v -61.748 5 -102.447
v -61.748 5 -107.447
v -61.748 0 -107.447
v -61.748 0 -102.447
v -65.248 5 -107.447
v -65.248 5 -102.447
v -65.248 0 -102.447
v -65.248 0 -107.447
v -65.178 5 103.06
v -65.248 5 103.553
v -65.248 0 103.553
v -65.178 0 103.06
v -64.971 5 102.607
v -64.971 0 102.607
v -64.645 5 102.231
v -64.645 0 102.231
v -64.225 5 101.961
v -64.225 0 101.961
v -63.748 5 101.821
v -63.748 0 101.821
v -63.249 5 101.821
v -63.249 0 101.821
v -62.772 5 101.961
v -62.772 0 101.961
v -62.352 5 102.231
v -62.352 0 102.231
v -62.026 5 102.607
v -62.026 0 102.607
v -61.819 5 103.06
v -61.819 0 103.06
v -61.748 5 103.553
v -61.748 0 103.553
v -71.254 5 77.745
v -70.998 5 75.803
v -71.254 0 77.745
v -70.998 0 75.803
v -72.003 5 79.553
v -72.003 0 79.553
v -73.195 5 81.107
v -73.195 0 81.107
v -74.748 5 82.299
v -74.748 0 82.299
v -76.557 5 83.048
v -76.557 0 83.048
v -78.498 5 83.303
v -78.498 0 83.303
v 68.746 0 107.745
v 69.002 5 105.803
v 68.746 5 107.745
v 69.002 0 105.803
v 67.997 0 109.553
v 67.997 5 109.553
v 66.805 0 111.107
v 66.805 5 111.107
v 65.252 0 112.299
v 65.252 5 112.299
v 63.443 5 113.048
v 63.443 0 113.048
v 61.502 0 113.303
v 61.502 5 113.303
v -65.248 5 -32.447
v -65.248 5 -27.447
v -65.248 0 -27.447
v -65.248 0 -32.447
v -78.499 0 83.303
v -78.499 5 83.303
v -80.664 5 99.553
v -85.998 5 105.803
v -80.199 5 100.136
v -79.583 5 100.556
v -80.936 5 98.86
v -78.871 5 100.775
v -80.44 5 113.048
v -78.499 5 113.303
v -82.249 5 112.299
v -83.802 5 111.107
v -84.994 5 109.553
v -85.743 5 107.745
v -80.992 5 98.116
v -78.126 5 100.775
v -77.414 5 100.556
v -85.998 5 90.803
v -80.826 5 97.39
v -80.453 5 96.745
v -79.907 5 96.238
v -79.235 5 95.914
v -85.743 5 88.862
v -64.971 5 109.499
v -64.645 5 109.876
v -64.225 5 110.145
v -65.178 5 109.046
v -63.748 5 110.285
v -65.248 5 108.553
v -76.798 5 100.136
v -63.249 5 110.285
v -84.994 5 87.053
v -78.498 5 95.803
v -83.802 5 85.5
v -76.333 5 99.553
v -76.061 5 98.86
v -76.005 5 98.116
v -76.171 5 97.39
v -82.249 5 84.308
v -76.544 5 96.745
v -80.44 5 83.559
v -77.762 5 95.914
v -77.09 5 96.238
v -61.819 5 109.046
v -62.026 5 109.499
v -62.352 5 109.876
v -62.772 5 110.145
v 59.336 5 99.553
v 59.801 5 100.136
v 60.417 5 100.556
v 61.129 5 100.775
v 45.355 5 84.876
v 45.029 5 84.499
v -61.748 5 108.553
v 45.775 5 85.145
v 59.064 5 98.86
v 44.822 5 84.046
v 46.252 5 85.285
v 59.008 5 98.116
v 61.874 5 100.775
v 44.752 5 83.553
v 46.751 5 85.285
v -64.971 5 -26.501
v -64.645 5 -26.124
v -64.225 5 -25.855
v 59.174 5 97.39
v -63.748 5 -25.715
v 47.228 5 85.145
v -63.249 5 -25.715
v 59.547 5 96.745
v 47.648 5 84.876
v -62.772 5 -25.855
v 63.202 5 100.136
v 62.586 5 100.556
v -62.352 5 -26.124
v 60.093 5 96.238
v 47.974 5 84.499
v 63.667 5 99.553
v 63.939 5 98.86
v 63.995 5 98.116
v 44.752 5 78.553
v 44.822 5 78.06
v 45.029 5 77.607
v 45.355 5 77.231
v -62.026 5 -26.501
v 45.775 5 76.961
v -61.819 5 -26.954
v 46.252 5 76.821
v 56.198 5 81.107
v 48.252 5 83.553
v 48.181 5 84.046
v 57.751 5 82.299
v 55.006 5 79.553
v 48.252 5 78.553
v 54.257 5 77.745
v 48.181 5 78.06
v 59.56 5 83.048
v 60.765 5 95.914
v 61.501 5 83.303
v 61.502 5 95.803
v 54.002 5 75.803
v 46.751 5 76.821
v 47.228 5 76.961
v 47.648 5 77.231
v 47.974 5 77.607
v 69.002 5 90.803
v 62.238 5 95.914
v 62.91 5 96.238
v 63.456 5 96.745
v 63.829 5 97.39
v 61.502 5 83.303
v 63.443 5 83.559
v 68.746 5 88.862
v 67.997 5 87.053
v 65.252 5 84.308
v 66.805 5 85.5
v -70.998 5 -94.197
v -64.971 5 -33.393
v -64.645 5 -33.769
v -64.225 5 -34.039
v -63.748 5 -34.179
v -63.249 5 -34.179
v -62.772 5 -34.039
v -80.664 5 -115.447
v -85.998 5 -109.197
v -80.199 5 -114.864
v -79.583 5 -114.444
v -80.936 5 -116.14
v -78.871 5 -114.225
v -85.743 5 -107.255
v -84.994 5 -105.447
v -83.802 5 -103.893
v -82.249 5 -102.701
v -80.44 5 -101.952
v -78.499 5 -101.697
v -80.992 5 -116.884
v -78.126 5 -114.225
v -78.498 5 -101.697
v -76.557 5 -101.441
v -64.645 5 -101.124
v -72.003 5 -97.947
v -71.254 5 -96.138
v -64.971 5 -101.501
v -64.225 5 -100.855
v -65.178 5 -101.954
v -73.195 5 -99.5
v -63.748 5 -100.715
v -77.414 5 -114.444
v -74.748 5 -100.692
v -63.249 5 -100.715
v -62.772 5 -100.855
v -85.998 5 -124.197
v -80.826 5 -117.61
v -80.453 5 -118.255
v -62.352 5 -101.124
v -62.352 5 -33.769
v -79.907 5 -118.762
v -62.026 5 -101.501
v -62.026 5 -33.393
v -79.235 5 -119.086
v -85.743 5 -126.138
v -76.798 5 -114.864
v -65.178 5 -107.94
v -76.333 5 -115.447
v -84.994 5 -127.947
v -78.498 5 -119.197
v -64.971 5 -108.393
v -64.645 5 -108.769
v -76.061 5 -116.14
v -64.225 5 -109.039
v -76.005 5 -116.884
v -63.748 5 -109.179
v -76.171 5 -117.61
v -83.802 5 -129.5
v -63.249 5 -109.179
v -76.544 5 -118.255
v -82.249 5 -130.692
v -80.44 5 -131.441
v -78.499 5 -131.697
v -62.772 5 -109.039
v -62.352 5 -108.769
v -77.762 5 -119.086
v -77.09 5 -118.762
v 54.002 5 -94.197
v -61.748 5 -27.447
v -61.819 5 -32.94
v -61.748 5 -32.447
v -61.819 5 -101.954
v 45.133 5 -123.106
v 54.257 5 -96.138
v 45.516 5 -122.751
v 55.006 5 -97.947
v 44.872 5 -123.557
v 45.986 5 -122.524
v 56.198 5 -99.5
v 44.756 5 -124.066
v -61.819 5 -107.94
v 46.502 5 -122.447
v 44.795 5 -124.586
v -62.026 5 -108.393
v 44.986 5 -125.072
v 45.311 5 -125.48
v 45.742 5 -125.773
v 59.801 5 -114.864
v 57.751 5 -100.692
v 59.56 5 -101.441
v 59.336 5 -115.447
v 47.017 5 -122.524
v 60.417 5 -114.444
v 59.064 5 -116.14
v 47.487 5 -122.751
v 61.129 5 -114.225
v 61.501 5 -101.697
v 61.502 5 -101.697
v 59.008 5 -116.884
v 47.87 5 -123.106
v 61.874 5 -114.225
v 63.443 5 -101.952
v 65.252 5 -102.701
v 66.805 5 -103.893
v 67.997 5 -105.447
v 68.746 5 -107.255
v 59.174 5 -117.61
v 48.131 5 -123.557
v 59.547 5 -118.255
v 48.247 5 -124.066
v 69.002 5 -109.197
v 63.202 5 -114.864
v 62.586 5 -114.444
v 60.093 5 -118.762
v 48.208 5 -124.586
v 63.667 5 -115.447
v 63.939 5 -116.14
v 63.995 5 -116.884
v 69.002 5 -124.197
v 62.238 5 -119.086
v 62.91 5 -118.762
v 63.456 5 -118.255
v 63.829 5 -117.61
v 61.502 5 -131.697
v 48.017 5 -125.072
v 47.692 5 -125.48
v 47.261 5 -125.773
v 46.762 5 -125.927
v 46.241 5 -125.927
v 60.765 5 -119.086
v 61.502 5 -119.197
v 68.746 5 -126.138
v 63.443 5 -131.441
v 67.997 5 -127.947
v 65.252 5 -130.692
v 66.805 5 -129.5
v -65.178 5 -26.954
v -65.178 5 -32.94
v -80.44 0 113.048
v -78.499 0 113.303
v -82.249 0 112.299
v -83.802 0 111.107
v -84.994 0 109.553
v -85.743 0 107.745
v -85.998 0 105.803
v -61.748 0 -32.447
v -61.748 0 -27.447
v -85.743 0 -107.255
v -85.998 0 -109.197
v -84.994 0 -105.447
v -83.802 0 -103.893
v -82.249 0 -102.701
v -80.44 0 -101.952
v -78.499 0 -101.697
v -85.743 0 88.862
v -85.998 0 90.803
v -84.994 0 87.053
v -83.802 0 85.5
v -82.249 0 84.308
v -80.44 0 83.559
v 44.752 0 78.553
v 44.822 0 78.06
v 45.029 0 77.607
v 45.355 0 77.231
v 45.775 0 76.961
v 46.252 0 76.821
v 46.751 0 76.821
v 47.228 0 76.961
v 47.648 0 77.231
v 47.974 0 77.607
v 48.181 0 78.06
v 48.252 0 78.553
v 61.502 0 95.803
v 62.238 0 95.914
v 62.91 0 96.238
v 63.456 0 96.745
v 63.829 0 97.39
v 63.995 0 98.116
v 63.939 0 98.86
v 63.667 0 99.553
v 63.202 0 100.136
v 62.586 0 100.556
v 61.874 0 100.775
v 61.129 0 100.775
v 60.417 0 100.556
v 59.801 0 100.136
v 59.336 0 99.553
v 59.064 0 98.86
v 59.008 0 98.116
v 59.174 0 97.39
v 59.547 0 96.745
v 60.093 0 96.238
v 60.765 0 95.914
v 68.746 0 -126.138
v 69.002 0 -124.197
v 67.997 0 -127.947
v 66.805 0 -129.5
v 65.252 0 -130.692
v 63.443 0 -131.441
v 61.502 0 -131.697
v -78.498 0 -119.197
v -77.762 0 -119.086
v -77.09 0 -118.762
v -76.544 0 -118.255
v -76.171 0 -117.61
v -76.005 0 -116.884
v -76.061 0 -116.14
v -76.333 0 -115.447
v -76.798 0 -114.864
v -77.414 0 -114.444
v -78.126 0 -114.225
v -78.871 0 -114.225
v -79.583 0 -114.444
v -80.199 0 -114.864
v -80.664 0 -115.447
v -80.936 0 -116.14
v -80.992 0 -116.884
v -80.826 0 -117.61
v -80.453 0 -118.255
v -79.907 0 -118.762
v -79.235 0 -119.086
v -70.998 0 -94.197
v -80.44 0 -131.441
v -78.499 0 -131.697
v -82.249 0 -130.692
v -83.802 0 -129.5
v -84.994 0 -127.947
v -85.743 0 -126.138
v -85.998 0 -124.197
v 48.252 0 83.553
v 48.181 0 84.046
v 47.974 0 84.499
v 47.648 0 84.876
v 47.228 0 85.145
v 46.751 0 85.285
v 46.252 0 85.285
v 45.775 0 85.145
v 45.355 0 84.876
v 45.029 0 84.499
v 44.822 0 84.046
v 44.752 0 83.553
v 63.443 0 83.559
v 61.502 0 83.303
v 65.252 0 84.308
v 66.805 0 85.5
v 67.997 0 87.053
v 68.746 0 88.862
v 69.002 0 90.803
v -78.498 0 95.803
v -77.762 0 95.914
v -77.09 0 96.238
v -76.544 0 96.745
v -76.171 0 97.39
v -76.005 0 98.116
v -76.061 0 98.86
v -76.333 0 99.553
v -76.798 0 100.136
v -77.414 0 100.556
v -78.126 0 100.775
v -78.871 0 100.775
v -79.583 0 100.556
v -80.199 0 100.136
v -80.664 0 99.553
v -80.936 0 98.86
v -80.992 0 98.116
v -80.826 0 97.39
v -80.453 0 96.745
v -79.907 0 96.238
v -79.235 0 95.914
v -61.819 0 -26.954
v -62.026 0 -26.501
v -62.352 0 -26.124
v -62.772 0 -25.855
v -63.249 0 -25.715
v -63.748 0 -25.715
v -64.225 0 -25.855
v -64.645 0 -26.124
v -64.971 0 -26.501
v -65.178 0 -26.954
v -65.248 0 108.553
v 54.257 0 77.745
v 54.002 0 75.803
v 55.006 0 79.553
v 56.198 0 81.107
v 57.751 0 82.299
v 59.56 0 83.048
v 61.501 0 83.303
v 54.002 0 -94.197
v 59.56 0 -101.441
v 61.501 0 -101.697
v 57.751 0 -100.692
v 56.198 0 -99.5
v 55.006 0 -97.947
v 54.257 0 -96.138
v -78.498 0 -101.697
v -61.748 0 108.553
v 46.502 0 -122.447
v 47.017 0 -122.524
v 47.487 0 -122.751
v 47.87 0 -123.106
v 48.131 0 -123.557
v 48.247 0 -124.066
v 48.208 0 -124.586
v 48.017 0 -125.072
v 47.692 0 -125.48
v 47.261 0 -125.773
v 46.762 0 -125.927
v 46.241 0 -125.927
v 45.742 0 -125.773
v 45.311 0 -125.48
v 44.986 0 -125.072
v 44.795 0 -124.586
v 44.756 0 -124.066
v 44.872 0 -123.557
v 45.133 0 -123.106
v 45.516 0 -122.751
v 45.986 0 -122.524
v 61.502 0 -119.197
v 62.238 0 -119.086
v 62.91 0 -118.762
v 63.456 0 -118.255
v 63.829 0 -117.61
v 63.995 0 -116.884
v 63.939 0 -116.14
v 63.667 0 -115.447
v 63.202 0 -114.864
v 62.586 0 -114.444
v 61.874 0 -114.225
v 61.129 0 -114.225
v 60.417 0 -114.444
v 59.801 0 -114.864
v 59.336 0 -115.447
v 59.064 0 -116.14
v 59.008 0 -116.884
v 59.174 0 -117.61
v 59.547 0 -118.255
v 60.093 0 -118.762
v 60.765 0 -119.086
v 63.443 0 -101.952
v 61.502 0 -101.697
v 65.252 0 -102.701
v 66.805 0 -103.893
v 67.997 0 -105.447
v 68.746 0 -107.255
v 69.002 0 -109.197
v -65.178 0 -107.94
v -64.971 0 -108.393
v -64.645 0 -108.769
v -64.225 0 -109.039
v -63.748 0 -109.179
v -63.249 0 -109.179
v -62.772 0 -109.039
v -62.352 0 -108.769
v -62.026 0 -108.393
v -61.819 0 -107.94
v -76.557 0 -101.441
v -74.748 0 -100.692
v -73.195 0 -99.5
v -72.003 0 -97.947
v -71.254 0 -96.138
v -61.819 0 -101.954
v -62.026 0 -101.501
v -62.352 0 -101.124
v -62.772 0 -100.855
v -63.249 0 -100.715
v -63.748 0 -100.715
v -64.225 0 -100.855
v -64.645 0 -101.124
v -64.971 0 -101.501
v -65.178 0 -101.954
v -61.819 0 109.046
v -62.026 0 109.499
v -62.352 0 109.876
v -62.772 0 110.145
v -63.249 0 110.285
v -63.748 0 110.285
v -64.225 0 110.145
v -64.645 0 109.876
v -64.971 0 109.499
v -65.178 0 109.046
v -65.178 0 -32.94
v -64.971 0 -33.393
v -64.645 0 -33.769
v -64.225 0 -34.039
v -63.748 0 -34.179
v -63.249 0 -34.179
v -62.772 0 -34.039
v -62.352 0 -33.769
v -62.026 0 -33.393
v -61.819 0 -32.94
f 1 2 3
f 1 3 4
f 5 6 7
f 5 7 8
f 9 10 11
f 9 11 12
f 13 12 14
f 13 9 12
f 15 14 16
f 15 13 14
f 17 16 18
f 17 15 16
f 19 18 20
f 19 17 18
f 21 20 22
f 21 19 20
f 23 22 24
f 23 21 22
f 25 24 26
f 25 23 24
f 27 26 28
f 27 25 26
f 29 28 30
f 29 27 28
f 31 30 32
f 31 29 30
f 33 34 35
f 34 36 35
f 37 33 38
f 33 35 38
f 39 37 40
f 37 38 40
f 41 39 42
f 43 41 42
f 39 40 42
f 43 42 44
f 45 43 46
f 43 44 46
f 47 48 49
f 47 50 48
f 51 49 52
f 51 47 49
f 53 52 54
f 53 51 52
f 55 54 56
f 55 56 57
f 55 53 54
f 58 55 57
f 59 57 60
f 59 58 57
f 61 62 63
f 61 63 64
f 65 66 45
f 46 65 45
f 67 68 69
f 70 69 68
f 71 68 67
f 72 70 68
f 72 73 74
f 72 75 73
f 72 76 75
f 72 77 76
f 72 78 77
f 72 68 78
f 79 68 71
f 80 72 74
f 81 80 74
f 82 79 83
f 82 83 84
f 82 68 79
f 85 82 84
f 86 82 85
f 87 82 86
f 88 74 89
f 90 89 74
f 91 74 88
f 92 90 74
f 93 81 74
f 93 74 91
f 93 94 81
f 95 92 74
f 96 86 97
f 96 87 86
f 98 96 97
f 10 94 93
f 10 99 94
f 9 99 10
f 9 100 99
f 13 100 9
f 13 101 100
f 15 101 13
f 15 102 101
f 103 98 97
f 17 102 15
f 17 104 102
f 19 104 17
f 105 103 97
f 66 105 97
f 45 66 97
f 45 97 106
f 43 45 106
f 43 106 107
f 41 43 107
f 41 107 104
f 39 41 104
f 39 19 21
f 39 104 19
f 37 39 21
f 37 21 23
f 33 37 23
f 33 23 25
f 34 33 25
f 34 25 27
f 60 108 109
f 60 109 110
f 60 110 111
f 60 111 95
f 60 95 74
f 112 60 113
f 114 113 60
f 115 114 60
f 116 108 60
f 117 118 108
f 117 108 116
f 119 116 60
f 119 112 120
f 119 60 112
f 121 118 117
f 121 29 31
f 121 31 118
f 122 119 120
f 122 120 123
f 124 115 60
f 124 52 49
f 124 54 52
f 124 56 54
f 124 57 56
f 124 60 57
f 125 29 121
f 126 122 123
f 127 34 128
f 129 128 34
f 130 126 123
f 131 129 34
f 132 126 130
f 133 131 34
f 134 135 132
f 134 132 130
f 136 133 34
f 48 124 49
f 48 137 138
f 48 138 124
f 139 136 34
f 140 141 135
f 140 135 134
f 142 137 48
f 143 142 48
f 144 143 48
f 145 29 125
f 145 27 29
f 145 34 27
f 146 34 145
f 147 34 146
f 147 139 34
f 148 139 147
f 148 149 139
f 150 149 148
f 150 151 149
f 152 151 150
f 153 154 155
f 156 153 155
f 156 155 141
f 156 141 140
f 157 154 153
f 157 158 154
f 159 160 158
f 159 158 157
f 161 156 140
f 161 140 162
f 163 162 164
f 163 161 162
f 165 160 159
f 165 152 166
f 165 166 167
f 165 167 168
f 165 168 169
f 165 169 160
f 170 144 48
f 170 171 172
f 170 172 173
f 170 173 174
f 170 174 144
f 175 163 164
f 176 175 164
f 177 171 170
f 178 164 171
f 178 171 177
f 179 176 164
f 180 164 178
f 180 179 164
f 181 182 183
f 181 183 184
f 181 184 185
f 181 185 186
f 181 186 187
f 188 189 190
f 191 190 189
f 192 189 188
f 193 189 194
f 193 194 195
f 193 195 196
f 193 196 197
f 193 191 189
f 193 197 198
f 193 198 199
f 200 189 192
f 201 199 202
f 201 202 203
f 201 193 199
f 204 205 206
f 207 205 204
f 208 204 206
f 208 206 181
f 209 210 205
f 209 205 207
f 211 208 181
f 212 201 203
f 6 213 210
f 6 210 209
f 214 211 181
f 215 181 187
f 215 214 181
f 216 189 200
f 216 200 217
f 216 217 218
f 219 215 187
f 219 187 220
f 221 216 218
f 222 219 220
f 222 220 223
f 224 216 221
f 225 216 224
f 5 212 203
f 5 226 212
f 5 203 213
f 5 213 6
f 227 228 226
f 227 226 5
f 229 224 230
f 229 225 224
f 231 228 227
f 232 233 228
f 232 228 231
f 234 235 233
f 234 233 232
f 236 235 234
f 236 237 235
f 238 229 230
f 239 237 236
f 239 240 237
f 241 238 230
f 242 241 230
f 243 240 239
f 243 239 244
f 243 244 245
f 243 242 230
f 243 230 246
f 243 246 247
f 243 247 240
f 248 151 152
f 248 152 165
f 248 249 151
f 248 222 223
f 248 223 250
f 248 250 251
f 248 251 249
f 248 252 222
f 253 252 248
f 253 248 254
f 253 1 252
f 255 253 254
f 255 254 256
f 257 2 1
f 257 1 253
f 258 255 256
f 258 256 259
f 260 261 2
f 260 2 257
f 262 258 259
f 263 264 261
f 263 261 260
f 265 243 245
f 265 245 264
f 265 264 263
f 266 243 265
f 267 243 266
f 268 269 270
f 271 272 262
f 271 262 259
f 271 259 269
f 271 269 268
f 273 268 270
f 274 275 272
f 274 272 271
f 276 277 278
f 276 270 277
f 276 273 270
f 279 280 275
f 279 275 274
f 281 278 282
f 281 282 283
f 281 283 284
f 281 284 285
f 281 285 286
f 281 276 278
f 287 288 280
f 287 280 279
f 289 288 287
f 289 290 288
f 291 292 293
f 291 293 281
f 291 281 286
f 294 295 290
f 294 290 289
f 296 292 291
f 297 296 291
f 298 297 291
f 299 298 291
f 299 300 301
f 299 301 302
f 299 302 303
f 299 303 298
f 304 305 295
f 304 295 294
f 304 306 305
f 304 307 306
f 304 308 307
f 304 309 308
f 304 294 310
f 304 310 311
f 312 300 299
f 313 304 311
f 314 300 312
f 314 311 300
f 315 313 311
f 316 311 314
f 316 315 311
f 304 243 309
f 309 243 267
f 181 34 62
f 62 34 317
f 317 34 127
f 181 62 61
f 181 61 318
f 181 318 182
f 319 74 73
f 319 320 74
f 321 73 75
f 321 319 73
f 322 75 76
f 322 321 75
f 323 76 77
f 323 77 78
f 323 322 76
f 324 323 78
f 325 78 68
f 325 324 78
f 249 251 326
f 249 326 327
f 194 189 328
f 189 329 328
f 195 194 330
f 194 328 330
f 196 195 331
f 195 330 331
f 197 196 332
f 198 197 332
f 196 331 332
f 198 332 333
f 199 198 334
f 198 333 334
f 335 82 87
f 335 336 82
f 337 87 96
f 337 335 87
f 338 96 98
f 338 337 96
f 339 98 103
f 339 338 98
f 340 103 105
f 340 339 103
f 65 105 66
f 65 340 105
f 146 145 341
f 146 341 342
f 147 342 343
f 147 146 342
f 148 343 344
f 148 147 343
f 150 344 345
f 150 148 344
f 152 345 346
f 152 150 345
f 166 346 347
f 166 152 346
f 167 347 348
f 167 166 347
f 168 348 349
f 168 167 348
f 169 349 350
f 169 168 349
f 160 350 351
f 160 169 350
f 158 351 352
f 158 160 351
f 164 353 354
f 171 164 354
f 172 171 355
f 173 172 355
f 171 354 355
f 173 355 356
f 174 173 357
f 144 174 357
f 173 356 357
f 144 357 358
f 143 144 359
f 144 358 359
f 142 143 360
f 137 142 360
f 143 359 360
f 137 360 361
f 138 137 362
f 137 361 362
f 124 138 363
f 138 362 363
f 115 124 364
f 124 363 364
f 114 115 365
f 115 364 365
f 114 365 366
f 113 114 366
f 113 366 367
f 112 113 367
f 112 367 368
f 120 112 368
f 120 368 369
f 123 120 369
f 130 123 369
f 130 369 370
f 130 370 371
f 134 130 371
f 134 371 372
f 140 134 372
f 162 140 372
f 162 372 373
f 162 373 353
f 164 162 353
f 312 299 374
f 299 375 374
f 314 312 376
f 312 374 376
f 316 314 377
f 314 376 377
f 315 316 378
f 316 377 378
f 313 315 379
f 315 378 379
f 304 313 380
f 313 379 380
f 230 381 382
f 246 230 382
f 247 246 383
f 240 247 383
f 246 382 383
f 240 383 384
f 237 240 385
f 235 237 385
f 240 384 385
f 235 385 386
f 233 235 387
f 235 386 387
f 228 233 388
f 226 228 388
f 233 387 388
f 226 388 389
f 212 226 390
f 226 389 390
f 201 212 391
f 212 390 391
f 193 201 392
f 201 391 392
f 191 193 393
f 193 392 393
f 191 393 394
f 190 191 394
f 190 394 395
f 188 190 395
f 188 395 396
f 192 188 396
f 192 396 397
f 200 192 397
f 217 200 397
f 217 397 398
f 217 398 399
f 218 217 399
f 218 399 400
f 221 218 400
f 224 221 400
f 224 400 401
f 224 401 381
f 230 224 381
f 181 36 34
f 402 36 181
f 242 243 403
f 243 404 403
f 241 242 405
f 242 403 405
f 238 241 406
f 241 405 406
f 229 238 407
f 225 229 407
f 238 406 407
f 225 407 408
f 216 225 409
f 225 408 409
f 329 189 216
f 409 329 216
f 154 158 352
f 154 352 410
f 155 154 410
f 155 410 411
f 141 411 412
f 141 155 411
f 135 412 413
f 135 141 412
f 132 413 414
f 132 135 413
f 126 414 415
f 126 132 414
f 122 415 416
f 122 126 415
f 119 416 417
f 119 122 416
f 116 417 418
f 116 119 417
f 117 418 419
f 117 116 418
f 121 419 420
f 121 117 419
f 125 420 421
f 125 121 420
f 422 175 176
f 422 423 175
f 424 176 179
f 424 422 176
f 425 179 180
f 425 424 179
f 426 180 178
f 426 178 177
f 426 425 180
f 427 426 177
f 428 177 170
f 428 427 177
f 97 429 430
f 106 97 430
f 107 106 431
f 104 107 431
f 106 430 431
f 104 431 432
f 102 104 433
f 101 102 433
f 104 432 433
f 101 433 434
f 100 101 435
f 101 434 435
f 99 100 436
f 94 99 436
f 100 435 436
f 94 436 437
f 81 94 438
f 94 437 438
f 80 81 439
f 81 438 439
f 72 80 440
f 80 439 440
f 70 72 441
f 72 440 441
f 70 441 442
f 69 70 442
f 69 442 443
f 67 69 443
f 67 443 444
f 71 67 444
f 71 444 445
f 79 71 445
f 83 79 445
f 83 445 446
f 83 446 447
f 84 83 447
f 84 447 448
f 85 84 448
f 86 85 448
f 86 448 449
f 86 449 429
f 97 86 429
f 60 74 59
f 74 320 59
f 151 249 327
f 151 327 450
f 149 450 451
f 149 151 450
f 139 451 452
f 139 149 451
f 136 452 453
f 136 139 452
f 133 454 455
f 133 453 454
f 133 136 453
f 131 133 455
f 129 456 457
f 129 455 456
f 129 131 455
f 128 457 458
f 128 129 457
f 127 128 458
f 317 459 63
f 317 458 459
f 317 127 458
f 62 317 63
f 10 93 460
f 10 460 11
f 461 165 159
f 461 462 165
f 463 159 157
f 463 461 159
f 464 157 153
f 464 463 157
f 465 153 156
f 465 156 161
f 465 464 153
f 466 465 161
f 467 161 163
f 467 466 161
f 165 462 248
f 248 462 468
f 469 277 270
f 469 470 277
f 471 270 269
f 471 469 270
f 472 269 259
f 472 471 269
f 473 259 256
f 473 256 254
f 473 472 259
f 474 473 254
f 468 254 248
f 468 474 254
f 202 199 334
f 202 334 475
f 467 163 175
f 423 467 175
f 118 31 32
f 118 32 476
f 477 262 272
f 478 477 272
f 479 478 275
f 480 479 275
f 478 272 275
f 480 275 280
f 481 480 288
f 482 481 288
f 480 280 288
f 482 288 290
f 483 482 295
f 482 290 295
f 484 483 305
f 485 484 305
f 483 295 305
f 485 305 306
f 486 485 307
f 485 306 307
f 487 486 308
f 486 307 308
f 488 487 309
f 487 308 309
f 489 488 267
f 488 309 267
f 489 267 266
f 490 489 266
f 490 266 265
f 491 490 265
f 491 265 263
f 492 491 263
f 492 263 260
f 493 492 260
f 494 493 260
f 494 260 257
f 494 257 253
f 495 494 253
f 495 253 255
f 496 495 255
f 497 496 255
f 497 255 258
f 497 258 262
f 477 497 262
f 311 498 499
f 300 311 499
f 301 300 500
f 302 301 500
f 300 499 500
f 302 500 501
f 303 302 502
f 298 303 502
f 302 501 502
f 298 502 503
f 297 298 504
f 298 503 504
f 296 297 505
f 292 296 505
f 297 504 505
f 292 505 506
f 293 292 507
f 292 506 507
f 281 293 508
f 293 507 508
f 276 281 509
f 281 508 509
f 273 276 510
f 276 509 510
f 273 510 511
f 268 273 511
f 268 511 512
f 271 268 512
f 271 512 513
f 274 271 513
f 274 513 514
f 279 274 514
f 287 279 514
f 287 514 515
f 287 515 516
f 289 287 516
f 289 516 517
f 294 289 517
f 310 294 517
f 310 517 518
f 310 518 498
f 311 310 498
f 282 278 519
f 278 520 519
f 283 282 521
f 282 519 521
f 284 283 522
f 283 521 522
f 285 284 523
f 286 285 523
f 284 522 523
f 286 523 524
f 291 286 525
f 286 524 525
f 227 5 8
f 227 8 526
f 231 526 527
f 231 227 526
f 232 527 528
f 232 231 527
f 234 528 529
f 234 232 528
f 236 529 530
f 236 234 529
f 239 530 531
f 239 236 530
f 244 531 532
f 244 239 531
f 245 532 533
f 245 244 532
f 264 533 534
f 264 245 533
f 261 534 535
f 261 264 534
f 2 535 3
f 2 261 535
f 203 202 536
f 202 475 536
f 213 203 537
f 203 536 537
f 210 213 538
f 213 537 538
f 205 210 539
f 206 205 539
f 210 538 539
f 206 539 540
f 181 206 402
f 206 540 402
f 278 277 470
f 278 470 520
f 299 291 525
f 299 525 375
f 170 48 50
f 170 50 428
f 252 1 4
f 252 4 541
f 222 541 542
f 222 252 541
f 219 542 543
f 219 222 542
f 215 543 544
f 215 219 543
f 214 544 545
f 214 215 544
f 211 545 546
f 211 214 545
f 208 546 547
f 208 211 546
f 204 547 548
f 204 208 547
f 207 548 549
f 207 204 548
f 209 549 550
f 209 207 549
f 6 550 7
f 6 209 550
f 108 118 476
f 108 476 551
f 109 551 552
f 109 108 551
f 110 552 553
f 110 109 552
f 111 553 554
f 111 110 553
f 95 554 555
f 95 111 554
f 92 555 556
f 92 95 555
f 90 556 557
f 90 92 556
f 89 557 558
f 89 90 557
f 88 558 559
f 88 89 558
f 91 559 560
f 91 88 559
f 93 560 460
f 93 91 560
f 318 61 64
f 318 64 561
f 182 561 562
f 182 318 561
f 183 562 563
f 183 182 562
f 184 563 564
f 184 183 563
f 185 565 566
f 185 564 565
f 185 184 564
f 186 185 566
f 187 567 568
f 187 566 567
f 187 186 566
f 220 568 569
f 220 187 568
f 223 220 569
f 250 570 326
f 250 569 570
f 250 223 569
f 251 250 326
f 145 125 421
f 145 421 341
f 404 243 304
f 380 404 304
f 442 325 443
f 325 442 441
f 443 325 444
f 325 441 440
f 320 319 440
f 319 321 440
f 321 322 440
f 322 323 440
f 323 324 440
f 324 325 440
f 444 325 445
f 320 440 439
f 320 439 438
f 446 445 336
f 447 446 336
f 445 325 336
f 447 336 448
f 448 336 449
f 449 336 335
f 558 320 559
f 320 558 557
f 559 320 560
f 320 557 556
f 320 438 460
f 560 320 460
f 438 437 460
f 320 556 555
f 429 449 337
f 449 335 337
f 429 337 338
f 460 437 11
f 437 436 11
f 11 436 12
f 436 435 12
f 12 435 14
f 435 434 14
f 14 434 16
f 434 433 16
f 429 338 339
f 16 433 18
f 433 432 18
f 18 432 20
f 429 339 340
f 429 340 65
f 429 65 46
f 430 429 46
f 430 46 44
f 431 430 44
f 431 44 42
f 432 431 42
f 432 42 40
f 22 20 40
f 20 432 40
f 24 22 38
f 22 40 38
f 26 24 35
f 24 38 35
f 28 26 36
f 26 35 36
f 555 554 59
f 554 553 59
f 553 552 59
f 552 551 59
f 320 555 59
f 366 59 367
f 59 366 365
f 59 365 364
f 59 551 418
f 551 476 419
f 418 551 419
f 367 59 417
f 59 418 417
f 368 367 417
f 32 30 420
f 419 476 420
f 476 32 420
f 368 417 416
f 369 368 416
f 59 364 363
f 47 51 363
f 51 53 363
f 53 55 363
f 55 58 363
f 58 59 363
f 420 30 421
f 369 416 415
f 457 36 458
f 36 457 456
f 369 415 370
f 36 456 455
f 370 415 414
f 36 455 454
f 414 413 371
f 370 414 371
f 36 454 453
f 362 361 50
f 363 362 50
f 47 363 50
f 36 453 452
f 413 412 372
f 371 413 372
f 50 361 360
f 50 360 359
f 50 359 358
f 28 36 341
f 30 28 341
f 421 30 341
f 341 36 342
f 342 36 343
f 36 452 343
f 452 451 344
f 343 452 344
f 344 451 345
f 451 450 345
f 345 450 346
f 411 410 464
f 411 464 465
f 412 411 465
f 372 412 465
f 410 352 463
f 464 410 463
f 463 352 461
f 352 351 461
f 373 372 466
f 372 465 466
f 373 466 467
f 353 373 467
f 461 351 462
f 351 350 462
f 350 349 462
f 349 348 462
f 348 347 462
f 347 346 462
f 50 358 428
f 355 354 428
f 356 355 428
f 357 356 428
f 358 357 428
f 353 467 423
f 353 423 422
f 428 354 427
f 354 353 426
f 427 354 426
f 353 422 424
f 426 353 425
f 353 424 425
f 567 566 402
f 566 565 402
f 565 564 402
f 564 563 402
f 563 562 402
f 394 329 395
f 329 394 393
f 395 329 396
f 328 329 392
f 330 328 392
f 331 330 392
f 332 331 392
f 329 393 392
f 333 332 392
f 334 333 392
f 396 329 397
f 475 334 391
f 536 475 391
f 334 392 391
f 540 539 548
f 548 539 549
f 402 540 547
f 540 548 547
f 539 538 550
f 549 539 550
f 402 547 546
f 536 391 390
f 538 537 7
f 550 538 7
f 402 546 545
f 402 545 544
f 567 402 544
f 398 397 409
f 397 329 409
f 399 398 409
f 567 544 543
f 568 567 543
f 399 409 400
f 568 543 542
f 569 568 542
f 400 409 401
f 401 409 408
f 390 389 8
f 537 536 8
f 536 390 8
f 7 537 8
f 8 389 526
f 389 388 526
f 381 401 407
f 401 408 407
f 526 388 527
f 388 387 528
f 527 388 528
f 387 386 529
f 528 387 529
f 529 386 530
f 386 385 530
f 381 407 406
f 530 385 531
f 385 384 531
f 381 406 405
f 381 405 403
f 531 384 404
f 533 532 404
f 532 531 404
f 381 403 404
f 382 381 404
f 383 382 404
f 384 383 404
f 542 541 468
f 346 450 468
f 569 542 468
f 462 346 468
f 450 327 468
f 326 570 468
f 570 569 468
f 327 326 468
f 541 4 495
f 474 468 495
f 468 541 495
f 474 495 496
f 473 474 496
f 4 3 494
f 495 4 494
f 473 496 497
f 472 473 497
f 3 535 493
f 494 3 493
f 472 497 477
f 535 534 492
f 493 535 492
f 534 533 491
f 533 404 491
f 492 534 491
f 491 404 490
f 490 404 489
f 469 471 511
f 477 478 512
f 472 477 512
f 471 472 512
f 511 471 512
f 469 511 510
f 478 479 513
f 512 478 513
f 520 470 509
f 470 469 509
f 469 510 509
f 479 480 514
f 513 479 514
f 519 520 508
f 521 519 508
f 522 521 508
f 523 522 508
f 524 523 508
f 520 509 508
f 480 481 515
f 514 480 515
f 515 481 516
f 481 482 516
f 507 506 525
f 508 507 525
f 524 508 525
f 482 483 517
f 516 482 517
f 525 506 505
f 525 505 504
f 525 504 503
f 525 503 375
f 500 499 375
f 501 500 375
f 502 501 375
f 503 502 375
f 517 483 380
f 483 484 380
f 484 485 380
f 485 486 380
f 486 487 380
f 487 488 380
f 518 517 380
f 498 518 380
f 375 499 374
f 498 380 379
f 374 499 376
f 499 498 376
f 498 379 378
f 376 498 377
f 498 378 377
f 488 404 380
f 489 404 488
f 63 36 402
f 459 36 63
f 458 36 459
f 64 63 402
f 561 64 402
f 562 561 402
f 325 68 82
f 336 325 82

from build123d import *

# Parameters (mm, degrees)
SKETCH1_W           = 125
SKETCH1_H           = 245
BOSS_EXTRUDE1_DEPTH = 5
SKETCH2_W           = 15
SKETCH2_H           = 30
BOSS_EXTRUDE2_DEPTH = 5
SKETCH3_R           = 2.5
CUT_EXTRUDE1_DEPTH  = 158.368235883
SKETCH4_R           = 1.75
CUT_EXTRUDE2_DEPTH  = 158.368235883
FILLET4_R           = 7.5


with BuildPart() as part:
    # Sketch1 → Boss-Extrude1 (new body)
    with BuildSketch(Plane(origin=(0, 0, 0), x_dir=(1, 0, 0), z_dir=(0, 1, 0))):
        with Locations((-8.498498498, 9.196696697)):
            Rectangle(SKETCH1_W, SKETCH1_H)
    extrude(amount=BOSS_EXTRUDE1_DEPTH)

    # Sketch2 → Boss-Extrude2 (add)
    with BuildSketch(Plane(origin=(0, 5, 0), x_dir=(1, 0, 0), z_dir=(0, 1, 0))):
        with Locations((61.501501502, 116.696696697)):
            Rectangle(SKETCH2_W, SKETCH2_H)
        with Locations((-78.498498498, 116.696696697)):
            Rectangle(SKETCH2_W, SKETCH2_H)
        with Locations((-78.498498498, -98.303303303)):
            Rectangle(SKETCH2_W, SKETCH2_H)
        with Locations((61.501501502, -98.303303303)):
            Rectangle(SKETCH2_W, SKETCH2_H)
    extrude(amount=-BOSS_EXTRUDE2_DEPTH)

    # Sketch3 → Cut-Extrude1 (cut, through all)
    with BuildSketch(Plane.XZ):
        with Locations(Location((-78.498498498, 98.303303303, 0), (0, 0, 270))):
            Circle(SKETCH3_R)
        with Locations(Location((61.501501502, 98.303303303, 0), (0, 0, 270))):
            Circle(SKETCH3_R)
        with Locations(Location((-78.498498498, -116.696696697, 0), (0, 0, 270))):
            Circle(SKETCH3_R)
        with Locations(Location((61.501501502, -116.696696697, 0), (0, 0, 270))):
            Circle(SKETCH3_R)
    extrude(amount=-CUT_EXTRUDE1_DEPTH, mode=Mode.SUBTRACT)

    # Sketch4 → Cut-Extrude2 (cut, through all)
    with BuildSketch(Plane(origin=(0, 5, 0), x_dir=(1, 0, 0), z_dir=(0, 1, 0))):
        with Locations(Location((46.501501502, 124.196696697, 0), (0, 0, 270))):
            Circle(SKETCH4_R)
        with BuildLine():
            Line((44.751501502, -83.553303303), (44.751501502, -78.553303303))
            ThreePointArc((44.751501502, -78.553303303), (46.501501502, -76.803303303), (48.251501502, -78.553303303))
            Line((48.251501502, -78.553303303), (48.251501502, -83.553303303))
            ThreePointArc((48.251501502, -83.553303303), (46.501501502, -85.303303303), (44.751501502, -83.553303303))
        make_face()
        with BuildLine():
            Line((-65.248498498, -108.553303303), (-65.248498498, -103.553303303))
            ThreePointArc((-65.248498498, -103.553303303), (-63.498498498, -101.803303303), (-61.748498498, -103.553303303))
            Line((-61.748498498, -103.553303303), (-61.748498498, -108.553303303))
            ThreePointArc((-61.748498498, -108.553303303), (-63.498498498, -110.303303303), (-65.248498498, -108.553303303))
        make_face()
        with BuildLine():
            Line((-65.248498498, 27.446696697), (-65.248498498, 32.446696697))
            ThreePointArc((-65.248498498, 32.446696697), (-63.498498498, 34.196696697), (-61.748498498, 32.446696697))
            Line((-61.748498498, 32.446696697), (-61.748498498, 27.446696697))
            ThreePointArc((-61.748498498, 27.446696697), (-63.498498498, 25.696696697), (-65.248498498, 27.446696697))
        make_face()
        with BuildLine():
            Line((-65.248498498, 102.446696697), (-65.248498498, 107.446696697))
            ThreePointArc((-65.248498498, 107.446696697), (-63.498498498, 109.196696697), (-61.748498498, 107.446696697))
            Line((-61.748498498, 107.446696697), (-61.748498498, 102.446696697))
            ThreePointArc((-61.748498498, 102.446696697), (-63.498498498, 100.696696697), (-65.248498498, 102.446696697))
        make_face()
    extrude(amount=-CUT_EXTRUDE2_DEPTH, mode=Mode.SUBTRACT)

    # Fillet4
    fillet4_edges = [part.edges().sort_by_distance(p)[0] for p in [
        (-70.998498498, 2.5, 83.303303303),
        (-85.998498498, 2.5, 83.303303303),
        (-85.998498498, 2.5, 113.303303303),
        (69.001501502, 2.5, 113.303303303),
        (69.001501502, 2.5, 83.303303303),
        (54.001501502, 2.5, 83.303303303),
        (54.001501502, 2.5, -101.696696697),
        (69.001501502, 2.5, -101.696696697),
        (69.001501502, 2.5, -131.696696697),
        (-85.998498498, 2.5, -131.696696697),
        (-70.998498498, 2.5, -101.696696697),
        (-85.998498498, 2.5, -101.696696697),
    ]]
    fillet(fillet4_edges, radius=FILLET4_R - 0.0001)  # a hair under: the kernel refuses the full size


solid = part.part
